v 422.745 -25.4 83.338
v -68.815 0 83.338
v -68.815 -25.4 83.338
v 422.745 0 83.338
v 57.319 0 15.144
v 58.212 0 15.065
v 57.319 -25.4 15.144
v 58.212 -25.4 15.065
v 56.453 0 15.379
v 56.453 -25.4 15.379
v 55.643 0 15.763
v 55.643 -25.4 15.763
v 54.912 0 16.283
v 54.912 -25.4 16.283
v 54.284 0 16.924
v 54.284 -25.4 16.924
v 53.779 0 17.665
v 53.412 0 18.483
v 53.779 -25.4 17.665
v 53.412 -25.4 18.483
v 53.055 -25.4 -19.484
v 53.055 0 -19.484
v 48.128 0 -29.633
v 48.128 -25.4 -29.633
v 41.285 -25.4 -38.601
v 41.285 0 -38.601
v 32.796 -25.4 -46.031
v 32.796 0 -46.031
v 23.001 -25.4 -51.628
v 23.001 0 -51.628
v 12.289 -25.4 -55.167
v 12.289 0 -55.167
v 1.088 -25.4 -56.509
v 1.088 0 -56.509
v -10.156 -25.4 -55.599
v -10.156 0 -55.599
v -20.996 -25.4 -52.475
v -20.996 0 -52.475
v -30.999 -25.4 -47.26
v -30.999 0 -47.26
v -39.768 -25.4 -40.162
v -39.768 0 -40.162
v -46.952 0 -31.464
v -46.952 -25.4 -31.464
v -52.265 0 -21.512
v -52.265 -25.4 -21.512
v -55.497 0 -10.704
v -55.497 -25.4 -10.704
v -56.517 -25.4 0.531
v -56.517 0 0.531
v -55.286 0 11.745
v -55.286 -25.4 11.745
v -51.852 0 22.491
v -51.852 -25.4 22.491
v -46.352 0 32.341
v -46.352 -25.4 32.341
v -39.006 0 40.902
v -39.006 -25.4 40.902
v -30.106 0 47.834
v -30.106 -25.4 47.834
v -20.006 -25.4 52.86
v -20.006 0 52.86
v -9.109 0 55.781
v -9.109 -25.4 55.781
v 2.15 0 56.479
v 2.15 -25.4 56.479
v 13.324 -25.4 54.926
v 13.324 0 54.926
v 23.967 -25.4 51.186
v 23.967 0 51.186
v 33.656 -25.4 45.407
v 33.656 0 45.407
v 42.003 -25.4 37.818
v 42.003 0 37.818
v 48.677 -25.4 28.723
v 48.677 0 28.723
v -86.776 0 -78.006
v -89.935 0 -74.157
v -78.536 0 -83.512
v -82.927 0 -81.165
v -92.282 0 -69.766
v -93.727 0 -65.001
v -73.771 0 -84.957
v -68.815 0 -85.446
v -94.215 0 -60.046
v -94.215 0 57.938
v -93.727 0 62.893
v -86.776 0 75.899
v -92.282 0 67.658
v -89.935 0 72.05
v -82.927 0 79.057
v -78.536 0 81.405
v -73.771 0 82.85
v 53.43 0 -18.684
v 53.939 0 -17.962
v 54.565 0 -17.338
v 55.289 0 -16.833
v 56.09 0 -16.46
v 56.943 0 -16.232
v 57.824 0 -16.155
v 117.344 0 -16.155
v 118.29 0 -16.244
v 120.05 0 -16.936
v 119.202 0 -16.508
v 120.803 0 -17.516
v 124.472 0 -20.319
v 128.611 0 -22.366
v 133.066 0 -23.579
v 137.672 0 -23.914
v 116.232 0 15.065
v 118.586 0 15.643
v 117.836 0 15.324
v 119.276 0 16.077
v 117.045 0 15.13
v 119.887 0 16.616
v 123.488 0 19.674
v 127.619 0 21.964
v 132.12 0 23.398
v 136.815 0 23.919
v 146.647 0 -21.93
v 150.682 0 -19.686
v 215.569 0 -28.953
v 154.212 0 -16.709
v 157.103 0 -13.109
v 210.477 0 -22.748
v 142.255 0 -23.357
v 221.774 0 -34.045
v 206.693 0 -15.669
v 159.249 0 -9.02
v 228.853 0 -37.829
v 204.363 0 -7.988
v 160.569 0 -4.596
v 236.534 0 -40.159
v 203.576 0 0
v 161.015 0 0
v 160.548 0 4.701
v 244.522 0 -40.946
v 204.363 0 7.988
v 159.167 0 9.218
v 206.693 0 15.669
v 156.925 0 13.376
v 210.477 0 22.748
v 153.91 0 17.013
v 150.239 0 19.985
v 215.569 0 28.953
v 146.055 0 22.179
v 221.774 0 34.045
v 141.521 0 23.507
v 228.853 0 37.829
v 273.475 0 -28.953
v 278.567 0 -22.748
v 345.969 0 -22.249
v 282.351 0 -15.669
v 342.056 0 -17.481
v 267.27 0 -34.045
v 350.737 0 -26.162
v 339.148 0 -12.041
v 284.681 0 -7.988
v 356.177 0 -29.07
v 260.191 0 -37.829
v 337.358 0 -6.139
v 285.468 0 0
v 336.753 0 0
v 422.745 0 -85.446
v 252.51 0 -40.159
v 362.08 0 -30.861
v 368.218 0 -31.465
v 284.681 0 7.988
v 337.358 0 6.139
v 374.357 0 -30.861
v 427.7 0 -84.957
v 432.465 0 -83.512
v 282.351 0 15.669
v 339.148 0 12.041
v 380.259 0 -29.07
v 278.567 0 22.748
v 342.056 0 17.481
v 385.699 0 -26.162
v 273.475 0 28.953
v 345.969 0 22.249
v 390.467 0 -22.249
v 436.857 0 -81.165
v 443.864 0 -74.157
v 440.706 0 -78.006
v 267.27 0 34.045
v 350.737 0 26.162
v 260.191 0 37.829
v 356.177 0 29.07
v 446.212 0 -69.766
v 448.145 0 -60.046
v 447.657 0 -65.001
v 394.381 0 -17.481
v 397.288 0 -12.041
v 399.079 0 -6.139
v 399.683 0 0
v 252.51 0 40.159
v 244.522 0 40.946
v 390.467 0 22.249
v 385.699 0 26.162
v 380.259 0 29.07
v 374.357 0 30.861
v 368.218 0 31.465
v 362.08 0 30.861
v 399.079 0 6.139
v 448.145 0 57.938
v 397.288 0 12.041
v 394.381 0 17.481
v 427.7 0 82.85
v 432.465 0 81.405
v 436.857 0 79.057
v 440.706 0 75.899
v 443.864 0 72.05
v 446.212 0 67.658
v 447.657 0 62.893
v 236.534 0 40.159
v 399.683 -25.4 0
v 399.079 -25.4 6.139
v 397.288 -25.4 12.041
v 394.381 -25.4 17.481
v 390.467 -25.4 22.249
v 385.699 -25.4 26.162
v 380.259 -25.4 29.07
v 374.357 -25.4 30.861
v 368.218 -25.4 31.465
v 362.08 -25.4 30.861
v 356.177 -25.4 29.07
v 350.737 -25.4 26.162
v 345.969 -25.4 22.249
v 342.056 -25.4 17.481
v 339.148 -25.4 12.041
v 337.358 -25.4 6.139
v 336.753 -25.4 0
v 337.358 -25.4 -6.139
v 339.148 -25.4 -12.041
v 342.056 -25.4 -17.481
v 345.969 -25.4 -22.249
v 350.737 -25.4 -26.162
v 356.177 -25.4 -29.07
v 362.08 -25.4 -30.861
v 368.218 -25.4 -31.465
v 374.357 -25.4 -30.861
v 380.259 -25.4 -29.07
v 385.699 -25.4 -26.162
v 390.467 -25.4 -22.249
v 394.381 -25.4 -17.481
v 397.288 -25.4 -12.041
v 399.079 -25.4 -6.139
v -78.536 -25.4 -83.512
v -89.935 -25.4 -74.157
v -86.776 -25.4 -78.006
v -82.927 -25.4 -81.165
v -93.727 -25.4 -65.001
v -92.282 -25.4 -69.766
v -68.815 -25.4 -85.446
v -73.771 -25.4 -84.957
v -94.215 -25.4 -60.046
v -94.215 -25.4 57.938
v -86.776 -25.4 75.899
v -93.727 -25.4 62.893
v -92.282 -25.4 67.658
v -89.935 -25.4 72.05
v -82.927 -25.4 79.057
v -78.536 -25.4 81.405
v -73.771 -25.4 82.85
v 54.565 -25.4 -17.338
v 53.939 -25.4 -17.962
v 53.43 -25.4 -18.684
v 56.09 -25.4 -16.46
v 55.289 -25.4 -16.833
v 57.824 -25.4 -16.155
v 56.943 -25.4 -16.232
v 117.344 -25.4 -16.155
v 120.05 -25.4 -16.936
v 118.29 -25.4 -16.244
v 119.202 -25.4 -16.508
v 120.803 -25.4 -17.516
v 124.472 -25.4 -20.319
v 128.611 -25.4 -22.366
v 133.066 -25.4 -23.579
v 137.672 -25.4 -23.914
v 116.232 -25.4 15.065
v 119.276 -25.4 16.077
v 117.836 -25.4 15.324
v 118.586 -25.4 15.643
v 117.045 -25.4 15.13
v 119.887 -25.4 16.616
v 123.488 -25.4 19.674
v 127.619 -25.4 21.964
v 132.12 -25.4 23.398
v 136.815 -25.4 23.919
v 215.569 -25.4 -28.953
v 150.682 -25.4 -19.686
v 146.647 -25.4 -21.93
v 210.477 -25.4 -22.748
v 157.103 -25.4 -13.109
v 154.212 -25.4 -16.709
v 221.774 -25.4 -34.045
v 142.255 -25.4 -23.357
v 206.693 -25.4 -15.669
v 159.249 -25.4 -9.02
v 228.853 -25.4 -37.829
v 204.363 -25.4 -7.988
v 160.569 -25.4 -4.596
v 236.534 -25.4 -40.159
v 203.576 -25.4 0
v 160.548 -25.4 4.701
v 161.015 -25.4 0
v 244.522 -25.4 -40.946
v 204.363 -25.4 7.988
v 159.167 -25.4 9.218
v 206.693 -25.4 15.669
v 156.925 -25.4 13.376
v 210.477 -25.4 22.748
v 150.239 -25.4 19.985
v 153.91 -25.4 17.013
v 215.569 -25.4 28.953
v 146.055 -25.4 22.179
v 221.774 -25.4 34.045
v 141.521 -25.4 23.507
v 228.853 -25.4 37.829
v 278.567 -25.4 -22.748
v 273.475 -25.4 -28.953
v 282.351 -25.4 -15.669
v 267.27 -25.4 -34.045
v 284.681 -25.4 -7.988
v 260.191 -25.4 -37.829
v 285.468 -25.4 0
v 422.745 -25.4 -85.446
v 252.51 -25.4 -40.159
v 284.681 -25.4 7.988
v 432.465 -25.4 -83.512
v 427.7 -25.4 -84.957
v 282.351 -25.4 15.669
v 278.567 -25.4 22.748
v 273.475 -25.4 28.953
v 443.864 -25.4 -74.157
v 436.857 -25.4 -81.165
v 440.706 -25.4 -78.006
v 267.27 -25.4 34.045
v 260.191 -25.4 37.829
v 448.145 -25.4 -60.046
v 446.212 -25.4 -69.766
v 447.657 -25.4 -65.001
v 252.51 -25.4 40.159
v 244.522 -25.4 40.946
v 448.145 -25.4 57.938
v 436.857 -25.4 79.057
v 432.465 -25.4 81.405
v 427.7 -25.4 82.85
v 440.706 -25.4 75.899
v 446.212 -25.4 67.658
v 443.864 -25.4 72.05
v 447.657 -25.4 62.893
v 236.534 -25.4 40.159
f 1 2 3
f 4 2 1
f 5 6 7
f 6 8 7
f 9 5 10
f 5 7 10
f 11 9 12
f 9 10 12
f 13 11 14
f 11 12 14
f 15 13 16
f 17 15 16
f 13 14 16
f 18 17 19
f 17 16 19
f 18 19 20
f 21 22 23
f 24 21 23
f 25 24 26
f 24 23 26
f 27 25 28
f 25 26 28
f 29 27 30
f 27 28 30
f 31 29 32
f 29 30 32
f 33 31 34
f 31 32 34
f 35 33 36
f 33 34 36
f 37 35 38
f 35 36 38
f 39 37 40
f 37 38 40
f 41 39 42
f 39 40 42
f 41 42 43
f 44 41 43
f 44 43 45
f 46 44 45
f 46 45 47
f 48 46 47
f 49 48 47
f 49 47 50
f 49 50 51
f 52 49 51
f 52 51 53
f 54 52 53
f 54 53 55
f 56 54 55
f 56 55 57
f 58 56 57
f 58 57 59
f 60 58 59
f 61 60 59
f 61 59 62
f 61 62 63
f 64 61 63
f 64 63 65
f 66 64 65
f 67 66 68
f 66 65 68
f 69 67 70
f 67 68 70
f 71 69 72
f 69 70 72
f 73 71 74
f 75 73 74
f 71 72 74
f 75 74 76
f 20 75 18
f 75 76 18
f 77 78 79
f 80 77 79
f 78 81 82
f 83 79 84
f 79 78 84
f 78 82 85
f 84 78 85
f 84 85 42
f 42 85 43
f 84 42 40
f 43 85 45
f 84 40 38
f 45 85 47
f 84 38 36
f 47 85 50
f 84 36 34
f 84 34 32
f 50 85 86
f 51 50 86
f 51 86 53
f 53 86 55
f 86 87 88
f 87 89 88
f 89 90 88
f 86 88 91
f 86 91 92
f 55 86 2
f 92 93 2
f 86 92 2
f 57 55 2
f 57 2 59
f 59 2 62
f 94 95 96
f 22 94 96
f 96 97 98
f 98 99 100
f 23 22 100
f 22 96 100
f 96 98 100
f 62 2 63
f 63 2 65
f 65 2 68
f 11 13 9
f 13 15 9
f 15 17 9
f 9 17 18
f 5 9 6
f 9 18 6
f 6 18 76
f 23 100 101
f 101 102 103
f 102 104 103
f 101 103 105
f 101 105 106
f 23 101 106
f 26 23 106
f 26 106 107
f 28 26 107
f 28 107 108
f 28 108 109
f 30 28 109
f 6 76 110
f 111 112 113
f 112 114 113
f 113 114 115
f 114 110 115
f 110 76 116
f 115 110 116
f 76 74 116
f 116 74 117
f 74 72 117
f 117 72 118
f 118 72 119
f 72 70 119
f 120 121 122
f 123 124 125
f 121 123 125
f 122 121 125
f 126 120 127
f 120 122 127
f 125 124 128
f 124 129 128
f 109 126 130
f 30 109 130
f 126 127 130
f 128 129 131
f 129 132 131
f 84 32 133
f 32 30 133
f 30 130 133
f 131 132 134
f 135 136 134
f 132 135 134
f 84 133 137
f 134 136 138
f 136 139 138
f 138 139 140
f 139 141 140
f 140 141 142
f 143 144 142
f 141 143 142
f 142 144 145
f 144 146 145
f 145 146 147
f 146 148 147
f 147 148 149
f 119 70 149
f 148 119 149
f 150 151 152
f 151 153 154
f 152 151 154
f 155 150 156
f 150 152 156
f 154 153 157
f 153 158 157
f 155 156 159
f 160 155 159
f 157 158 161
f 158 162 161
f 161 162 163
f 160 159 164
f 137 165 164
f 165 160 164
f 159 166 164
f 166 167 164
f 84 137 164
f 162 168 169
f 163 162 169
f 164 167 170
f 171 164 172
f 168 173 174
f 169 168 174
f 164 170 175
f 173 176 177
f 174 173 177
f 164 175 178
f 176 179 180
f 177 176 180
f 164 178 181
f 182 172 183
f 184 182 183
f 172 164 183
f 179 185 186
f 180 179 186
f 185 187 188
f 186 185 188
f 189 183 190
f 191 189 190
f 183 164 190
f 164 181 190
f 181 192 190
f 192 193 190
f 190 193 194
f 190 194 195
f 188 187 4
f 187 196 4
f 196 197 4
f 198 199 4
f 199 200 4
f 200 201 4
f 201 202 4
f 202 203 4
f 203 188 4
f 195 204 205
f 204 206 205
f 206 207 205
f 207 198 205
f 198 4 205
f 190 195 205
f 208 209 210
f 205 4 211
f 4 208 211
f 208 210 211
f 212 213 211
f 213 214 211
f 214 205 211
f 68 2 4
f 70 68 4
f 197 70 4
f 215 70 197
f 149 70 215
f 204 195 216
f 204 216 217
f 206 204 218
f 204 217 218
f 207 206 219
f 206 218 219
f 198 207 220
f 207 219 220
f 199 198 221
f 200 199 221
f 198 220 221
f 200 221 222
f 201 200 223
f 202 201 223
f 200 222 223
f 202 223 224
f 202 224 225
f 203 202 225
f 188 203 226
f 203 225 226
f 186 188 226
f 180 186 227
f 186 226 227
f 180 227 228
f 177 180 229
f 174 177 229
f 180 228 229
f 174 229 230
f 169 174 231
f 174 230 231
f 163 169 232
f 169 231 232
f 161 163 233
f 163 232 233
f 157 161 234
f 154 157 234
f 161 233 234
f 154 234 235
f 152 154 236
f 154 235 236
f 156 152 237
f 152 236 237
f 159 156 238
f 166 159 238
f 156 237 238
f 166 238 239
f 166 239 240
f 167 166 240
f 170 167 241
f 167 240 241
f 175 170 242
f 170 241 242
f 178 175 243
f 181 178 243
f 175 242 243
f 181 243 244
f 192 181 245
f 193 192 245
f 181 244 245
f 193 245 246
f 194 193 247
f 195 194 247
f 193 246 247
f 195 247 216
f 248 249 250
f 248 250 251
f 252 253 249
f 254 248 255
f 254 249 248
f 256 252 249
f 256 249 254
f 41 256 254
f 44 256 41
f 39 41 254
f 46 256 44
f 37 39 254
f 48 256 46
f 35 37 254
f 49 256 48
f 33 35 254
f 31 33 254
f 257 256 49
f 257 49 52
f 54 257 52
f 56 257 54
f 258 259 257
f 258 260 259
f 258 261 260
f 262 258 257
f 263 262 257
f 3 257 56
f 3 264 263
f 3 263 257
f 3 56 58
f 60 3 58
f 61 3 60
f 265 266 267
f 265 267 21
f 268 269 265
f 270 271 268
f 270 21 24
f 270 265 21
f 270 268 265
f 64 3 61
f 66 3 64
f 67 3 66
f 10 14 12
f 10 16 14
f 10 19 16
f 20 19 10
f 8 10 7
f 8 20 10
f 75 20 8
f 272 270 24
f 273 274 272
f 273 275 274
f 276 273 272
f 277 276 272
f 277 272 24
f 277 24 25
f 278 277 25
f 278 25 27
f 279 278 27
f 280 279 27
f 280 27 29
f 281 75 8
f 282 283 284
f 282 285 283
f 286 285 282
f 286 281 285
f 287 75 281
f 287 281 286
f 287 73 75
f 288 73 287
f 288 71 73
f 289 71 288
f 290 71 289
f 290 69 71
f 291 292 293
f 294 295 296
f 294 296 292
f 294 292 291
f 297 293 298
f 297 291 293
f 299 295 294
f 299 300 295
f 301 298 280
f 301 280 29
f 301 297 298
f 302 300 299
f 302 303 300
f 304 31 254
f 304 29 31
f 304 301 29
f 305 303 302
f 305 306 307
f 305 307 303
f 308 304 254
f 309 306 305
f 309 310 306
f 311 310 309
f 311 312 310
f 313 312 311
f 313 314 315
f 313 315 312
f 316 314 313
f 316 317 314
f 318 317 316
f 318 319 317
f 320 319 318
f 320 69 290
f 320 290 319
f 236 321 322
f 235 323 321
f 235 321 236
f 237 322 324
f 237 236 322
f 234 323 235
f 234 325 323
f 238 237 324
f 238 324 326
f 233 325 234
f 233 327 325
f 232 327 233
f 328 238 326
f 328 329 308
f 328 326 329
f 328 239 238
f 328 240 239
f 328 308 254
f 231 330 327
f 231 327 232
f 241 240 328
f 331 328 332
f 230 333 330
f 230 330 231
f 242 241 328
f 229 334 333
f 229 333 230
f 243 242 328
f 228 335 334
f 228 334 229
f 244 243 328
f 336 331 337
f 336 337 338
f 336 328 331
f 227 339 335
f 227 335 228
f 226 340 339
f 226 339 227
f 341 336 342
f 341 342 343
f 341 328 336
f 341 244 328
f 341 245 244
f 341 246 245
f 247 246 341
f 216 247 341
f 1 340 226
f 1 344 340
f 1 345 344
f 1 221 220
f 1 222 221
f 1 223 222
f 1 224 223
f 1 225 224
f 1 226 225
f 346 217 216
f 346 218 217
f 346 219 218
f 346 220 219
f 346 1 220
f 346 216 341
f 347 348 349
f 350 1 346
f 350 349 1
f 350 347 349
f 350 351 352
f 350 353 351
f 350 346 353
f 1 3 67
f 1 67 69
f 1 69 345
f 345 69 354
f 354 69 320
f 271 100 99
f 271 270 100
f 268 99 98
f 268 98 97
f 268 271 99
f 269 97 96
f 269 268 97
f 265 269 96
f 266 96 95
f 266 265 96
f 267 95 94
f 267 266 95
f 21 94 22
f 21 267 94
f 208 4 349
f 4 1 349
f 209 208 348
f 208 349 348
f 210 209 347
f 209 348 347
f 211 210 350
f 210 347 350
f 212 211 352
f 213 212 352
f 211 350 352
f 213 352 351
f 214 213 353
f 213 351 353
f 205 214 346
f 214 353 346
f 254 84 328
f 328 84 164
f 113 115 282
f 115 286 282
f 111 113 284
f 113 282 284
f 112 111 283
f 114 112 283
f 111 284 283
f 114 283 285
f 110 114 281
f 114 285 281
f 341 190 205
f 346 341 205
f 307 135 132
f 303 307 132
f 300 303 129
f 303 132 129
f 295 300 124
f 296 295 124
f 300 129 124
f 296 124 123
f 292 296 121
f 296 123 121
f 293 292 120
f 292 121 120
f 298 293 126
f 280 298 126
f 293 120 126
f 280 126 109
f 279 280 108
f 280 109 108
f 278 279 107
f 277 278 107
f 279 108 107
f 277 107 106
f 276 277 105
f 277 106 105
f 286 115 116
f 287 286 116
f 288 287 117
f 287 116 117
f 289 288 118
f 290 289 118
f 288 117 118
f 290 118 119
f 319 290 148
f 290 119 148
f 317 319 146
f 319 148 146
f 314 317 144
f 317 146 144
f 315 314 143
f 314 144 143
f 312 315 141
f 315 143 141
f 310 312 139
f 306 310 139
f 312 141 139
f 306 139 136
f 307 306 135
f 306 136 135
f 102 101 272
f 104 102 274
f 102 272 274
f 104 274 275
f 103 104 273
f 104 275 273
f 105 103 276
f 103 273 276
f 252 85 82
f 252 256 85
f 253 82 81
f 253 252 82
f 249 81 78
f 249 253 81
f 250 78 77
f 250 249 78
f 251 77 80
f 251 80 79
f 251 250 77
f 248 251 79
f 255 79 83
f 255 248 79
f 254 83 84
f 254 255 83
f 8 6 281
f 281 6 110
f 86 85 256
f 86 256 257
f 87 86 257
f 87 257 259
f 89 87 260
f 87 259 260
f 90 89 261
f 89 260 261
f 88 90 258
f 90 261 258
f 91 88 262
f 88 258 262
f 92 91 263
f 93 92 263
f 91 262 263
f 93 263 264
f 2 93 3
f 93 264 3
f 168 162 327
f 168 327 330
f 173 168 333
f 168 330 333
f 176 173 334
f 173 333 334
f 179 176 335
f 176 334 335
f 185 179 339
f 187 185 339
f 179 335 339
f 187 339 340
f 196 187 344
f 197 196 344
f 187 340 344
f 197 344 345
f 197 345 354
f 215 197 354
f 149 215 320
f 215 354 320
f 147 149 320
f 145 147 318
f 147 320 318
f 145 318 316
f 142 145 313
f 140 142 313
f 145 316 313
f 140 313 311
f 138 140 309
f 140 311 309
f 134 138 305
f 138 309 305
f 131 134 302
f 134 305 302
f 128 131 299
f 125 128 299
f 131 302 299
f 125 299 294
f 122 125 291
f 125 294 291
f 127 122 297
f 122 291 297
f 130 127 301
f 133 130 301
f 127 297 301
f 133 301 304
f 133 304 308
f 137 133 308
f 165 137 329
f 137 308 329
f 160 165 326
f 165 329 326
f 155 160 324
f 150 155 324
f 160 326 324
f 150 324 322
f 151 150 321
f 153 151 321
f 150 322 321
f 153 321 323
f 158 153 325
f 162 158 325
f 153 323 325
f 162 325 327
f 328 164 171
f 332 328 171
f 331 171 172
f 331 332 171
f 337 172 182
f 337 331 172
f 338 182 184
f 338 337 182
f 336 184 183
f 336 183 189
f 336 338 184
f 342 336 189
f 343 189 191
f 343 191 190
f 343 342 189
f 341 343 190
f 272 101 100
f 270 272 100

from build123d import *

# Parameters (mm, degrees)
F0_W     = 542.360485
F0_H     = 168.78362
F1_DEPTH = 25.4
F2_R     = 25.4
F3_R     = 5.08
F4_R     = 40.946122
F4_R_2   = 31.465149
F5_DEPTH = 25.4


with BuildPart() as f1:
    # F0 (on Front) → F1 (new body)
    with BuildSketch(Plane.XZ):
        with Locations((176.964849, -1.053691)):
            Rectangle(F0_W, F0_H)
        with BuildLine():
            ThreePointArc((54.161403, -16.155303), (-56.51663, 0.567409), (54.474841, 15.064629))
            Line((54.474841, 15.064629), (118.513588, 15.064629))
            ThreePointArc((118.513588, 15.064629), (145.08589, 22.54609), (161.0149, 0))
            ThreePointArc((161.0149, 0), (145.760851, -22.295352), (119.453656, -16.155303))
            Line((119.453656, -16.155303), (54.161403, -16.155303))
        make_face(mode=Mode.SUBTRACT)
    extrude(amount=F1_DEPTH)

    # F2
    f2_edges = [f1.edges().sort_by_distance(p)[0] for p in [
        (448.145092, -12.7, 83.338119),
        (448.145092, -12.7, -85.445501),
        (-94.215393, -12.7, 83.338119),
        (-94.215393, -12.7, -85.445501),
    ]]
    fillet(f2_edges, radius=F2_R)

    # F3
    f3_edges = [f1.edges().sort_by_distance(p)[0] for p in [
        (54.474841, -12.7, 15.064629),
        (119.453656, -12.7, -16.155303),
        (54.161403, -12.7, -16.155303),
        (118.513588, -12.7, 15.064629),
    ]]
    fillet(f3_edges, radius=F3_R)

    # F4 (on face) → F5 (cut)
    with BuildSketch(Plane.XZ.offset(25.4)):
        with Locations((244.522035, 0)):
            Circle(F4_R)
        with Locations((368.218273, 0)):
            Circle(F4_R_2)
    extrude(amount=-F5_DEPTH, mode=Mode.SUBTRACT)


solid = f1.part
